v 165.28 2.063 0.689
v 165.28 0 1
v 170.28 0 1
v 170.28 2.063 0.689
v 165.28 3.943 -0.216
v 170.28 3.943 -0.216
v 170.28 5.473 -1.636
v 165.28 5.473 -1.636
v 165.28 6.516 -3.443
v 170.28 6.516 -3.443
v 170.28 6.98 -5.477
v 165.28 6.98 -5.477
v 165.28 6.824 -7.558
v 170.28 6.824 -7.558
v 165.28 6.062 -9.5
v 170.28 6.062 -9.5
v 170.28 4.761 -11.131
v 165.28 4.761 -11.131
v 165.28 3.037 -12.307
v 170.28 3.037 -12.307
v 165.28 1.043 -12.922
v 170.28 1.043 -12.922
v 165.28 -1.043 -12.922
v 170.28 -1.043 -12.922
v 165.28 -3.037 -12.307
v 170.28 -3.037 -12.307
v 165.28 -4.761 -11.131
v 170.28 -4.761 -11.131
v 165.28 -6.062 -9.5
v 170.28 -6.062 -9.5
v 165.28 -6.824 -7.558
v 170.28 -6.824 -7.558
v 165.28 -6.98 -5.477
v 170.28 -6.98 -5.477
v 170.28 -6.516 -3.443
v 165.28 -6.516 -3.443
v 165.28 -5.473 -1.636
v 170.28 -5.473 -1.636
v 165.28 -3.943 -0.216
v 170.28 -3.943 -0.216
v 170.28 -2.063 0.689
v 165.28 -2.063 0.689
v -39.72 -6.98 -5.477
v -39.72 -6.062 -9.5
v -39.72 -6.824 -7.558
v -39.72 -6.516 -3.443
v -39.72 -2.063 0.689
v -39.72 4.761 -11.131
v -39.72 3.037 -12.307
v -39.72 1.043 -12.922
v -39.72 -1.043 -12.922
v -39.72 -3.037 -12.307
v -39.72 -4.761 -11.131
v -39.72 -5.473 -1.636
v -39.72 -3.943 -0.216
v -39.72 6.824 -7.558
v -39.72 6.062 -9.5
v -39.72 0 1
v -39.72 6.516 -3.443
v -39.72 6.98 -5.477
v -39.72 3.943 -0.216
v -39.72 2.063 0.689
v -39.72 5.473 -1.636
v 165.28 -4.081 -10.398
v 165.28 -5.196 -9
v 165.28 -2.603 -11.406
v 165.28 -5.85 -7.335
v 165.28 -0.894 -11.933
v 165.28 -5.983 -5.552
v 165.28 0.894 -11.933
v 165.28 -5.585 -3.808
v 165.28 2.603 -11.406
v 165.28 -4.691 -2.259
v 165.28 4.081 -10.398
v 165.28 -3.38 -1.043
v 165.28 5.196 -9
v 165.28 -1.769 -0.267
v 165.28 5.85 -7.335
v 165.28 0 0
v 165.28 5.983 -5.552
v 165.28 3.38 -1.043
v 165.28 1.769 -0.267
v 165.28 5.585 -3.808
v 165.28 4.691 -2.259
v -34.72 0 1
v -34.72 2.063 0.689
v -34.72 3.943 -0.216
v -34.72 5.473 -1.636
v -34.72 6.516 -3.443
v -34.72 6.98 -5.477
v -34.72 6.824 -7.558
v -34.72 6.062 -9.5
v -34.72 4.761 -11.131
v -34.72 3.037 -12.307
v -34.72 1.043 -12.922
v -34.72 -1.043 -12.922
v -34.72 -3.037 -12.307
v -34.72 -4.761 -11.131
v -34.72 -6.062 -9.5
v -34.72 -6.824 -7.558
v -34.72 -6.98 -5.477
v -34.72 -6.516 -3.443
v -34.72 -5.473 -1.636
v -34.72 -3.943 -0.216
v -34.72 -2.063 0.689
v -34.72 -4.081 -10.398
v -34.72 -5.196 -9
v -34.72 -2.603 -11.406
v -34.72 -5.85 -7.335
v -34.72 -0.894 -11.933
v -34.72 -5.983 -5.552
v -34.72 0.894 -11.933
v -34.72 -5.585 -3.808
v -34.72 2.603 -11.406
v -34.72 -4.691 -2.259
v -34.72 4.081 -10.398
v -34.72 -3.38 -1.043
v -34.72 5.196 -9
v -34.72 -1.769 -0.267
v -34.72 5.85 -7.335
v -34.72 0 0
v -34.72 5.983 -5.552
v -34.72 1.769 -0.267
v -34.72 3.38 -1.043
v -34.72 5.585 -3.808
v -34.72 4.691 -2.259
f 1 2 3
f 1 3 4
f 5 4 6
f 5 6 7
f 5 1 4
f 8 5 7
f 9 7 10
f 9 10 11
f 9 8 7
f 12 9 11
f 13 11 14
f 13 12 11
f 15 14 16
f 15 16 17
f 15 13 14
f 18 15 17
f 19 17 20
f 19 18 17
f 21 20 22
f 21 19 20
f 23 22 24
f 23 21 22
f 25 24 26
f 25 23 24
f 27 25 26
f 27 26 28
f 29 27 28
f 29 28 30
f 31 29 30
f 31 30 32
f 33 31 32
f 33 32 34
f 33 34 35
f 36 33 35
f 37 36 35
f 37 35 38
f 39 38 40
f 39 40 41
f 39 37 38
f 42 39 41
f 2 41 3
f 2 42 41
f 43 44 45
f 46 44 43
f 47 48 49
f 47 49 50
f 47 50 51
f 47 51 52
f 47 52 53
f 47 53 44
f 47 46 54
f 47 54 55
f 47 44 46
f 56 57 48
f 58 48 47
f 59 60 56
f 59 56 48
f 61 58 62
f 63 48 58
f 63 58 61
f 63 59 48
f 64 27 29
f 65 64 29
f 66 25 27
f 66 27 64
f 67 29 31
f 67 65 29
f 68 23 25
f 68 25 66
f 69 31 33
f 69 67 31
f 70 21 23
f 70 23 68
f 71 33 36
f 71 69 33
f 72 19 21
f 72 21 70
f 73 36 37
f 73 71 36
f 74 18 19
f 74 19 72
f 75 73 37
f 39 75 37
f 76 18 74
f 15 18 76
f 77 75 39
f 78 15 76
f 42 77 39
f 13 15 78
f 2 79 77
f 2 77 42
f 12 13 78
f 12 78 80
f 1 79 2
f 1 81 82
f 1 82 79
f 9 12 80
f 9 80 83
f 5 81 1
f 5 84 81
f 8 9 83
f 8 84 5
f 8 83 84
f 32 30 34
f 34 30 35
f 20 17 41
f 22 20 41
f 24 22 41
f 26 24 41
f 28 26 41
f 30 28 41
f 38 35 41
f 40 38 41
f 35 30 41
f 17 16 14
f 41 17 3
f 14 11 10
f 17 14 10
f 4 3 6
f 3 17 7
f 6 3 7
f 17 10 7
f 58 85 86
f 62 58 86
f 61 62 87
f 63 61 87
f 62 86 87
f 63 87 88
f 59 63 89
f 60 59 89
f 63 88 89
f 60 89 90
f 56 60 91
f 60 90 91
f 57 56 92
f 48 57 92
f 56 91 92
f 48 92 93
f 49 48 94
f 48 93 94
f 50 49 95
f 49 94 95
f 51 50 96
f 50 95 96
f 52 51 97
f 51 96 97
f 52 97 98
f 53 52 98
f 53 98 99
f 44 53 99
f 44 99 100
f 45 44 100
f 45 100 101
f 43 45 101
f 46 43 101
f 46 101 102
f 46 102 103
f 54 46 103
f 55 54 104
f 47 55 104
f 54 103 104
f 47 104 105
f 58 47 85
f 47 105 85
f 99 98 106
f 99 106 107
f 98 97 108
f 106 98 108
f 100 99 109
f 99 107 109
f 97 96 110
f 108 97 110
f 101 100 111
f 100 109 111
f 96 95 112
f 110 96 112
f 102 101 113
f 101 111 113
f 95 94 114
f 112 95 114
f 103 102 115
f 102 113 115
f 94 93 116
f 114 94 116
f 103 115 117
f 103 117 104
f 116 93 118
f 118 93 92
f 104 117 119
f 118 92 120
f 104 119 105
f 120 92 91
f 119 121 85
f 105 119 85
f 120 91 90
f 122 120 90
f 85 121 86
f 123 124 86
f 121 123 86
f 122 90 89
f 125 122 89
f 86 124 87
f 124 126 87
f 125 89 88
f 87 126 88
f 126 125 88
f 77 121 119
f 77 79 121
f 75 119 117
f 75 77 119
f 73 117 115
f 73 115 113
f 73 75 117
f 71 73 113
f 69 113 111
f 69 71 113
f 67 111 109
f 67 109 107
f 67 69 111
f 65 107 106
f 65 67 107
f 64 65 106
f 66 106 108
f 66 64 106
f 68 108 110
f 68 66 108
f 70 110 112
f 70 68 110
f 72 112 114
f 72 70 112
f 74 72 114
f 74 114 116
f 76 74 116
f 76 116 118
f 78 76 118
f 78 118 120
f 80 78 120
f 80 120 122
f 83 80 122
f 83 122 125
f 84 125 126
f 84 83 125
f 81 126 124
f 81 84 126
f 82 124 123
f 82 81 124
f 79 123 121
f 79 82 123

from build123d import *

# Parameters (mm, degrees)
SKETCH1_W           = 200
SKETCH1_H           = 6
SKETCH2_R           = 7
BOSS_EXTRUDE1_DEPTH = 5


with BuildPart() as part:
    # Sketch1 → Revolve1 (revolve)
    with BuildSketch(Plane(origin=(0, 0, 0), x_dir=(1, 0, 0), z_dir=(0, 1, 0)), mode=Mode.PRIVATE) as revolve1_sk:
        with Locations((65.279538905, 9)):
            Rectangle(SKETCH1_W, SKETCH1_H)
    revolve(revolve1_sk.sketch.rotate(Axis((-34.720461095, 0, -6), (1, 0, 0)), 180), axis=Axis((-34.720461095, 0, -6), (1, 0, 0)))

    # Sketch2 → Boss-Extrude1 (add)
    with BuildSketch(Plane.ZY.offset(34.720461095)):
        with Locations((-6, 0)):
            Circle(SKETCH2_R)
    boss_extrude1 = extrude(amount=BOSS_EXTRUDE1_DEPTH)

    # Mirror1: Boss-Extrude1 across plane
    add(boss_extrude1.mirror(Plane(origin=(65.279538905, 0, 0), x_dir=(0, 0, 1), z_dir=(1, 0, 0))))


solid = part.part
